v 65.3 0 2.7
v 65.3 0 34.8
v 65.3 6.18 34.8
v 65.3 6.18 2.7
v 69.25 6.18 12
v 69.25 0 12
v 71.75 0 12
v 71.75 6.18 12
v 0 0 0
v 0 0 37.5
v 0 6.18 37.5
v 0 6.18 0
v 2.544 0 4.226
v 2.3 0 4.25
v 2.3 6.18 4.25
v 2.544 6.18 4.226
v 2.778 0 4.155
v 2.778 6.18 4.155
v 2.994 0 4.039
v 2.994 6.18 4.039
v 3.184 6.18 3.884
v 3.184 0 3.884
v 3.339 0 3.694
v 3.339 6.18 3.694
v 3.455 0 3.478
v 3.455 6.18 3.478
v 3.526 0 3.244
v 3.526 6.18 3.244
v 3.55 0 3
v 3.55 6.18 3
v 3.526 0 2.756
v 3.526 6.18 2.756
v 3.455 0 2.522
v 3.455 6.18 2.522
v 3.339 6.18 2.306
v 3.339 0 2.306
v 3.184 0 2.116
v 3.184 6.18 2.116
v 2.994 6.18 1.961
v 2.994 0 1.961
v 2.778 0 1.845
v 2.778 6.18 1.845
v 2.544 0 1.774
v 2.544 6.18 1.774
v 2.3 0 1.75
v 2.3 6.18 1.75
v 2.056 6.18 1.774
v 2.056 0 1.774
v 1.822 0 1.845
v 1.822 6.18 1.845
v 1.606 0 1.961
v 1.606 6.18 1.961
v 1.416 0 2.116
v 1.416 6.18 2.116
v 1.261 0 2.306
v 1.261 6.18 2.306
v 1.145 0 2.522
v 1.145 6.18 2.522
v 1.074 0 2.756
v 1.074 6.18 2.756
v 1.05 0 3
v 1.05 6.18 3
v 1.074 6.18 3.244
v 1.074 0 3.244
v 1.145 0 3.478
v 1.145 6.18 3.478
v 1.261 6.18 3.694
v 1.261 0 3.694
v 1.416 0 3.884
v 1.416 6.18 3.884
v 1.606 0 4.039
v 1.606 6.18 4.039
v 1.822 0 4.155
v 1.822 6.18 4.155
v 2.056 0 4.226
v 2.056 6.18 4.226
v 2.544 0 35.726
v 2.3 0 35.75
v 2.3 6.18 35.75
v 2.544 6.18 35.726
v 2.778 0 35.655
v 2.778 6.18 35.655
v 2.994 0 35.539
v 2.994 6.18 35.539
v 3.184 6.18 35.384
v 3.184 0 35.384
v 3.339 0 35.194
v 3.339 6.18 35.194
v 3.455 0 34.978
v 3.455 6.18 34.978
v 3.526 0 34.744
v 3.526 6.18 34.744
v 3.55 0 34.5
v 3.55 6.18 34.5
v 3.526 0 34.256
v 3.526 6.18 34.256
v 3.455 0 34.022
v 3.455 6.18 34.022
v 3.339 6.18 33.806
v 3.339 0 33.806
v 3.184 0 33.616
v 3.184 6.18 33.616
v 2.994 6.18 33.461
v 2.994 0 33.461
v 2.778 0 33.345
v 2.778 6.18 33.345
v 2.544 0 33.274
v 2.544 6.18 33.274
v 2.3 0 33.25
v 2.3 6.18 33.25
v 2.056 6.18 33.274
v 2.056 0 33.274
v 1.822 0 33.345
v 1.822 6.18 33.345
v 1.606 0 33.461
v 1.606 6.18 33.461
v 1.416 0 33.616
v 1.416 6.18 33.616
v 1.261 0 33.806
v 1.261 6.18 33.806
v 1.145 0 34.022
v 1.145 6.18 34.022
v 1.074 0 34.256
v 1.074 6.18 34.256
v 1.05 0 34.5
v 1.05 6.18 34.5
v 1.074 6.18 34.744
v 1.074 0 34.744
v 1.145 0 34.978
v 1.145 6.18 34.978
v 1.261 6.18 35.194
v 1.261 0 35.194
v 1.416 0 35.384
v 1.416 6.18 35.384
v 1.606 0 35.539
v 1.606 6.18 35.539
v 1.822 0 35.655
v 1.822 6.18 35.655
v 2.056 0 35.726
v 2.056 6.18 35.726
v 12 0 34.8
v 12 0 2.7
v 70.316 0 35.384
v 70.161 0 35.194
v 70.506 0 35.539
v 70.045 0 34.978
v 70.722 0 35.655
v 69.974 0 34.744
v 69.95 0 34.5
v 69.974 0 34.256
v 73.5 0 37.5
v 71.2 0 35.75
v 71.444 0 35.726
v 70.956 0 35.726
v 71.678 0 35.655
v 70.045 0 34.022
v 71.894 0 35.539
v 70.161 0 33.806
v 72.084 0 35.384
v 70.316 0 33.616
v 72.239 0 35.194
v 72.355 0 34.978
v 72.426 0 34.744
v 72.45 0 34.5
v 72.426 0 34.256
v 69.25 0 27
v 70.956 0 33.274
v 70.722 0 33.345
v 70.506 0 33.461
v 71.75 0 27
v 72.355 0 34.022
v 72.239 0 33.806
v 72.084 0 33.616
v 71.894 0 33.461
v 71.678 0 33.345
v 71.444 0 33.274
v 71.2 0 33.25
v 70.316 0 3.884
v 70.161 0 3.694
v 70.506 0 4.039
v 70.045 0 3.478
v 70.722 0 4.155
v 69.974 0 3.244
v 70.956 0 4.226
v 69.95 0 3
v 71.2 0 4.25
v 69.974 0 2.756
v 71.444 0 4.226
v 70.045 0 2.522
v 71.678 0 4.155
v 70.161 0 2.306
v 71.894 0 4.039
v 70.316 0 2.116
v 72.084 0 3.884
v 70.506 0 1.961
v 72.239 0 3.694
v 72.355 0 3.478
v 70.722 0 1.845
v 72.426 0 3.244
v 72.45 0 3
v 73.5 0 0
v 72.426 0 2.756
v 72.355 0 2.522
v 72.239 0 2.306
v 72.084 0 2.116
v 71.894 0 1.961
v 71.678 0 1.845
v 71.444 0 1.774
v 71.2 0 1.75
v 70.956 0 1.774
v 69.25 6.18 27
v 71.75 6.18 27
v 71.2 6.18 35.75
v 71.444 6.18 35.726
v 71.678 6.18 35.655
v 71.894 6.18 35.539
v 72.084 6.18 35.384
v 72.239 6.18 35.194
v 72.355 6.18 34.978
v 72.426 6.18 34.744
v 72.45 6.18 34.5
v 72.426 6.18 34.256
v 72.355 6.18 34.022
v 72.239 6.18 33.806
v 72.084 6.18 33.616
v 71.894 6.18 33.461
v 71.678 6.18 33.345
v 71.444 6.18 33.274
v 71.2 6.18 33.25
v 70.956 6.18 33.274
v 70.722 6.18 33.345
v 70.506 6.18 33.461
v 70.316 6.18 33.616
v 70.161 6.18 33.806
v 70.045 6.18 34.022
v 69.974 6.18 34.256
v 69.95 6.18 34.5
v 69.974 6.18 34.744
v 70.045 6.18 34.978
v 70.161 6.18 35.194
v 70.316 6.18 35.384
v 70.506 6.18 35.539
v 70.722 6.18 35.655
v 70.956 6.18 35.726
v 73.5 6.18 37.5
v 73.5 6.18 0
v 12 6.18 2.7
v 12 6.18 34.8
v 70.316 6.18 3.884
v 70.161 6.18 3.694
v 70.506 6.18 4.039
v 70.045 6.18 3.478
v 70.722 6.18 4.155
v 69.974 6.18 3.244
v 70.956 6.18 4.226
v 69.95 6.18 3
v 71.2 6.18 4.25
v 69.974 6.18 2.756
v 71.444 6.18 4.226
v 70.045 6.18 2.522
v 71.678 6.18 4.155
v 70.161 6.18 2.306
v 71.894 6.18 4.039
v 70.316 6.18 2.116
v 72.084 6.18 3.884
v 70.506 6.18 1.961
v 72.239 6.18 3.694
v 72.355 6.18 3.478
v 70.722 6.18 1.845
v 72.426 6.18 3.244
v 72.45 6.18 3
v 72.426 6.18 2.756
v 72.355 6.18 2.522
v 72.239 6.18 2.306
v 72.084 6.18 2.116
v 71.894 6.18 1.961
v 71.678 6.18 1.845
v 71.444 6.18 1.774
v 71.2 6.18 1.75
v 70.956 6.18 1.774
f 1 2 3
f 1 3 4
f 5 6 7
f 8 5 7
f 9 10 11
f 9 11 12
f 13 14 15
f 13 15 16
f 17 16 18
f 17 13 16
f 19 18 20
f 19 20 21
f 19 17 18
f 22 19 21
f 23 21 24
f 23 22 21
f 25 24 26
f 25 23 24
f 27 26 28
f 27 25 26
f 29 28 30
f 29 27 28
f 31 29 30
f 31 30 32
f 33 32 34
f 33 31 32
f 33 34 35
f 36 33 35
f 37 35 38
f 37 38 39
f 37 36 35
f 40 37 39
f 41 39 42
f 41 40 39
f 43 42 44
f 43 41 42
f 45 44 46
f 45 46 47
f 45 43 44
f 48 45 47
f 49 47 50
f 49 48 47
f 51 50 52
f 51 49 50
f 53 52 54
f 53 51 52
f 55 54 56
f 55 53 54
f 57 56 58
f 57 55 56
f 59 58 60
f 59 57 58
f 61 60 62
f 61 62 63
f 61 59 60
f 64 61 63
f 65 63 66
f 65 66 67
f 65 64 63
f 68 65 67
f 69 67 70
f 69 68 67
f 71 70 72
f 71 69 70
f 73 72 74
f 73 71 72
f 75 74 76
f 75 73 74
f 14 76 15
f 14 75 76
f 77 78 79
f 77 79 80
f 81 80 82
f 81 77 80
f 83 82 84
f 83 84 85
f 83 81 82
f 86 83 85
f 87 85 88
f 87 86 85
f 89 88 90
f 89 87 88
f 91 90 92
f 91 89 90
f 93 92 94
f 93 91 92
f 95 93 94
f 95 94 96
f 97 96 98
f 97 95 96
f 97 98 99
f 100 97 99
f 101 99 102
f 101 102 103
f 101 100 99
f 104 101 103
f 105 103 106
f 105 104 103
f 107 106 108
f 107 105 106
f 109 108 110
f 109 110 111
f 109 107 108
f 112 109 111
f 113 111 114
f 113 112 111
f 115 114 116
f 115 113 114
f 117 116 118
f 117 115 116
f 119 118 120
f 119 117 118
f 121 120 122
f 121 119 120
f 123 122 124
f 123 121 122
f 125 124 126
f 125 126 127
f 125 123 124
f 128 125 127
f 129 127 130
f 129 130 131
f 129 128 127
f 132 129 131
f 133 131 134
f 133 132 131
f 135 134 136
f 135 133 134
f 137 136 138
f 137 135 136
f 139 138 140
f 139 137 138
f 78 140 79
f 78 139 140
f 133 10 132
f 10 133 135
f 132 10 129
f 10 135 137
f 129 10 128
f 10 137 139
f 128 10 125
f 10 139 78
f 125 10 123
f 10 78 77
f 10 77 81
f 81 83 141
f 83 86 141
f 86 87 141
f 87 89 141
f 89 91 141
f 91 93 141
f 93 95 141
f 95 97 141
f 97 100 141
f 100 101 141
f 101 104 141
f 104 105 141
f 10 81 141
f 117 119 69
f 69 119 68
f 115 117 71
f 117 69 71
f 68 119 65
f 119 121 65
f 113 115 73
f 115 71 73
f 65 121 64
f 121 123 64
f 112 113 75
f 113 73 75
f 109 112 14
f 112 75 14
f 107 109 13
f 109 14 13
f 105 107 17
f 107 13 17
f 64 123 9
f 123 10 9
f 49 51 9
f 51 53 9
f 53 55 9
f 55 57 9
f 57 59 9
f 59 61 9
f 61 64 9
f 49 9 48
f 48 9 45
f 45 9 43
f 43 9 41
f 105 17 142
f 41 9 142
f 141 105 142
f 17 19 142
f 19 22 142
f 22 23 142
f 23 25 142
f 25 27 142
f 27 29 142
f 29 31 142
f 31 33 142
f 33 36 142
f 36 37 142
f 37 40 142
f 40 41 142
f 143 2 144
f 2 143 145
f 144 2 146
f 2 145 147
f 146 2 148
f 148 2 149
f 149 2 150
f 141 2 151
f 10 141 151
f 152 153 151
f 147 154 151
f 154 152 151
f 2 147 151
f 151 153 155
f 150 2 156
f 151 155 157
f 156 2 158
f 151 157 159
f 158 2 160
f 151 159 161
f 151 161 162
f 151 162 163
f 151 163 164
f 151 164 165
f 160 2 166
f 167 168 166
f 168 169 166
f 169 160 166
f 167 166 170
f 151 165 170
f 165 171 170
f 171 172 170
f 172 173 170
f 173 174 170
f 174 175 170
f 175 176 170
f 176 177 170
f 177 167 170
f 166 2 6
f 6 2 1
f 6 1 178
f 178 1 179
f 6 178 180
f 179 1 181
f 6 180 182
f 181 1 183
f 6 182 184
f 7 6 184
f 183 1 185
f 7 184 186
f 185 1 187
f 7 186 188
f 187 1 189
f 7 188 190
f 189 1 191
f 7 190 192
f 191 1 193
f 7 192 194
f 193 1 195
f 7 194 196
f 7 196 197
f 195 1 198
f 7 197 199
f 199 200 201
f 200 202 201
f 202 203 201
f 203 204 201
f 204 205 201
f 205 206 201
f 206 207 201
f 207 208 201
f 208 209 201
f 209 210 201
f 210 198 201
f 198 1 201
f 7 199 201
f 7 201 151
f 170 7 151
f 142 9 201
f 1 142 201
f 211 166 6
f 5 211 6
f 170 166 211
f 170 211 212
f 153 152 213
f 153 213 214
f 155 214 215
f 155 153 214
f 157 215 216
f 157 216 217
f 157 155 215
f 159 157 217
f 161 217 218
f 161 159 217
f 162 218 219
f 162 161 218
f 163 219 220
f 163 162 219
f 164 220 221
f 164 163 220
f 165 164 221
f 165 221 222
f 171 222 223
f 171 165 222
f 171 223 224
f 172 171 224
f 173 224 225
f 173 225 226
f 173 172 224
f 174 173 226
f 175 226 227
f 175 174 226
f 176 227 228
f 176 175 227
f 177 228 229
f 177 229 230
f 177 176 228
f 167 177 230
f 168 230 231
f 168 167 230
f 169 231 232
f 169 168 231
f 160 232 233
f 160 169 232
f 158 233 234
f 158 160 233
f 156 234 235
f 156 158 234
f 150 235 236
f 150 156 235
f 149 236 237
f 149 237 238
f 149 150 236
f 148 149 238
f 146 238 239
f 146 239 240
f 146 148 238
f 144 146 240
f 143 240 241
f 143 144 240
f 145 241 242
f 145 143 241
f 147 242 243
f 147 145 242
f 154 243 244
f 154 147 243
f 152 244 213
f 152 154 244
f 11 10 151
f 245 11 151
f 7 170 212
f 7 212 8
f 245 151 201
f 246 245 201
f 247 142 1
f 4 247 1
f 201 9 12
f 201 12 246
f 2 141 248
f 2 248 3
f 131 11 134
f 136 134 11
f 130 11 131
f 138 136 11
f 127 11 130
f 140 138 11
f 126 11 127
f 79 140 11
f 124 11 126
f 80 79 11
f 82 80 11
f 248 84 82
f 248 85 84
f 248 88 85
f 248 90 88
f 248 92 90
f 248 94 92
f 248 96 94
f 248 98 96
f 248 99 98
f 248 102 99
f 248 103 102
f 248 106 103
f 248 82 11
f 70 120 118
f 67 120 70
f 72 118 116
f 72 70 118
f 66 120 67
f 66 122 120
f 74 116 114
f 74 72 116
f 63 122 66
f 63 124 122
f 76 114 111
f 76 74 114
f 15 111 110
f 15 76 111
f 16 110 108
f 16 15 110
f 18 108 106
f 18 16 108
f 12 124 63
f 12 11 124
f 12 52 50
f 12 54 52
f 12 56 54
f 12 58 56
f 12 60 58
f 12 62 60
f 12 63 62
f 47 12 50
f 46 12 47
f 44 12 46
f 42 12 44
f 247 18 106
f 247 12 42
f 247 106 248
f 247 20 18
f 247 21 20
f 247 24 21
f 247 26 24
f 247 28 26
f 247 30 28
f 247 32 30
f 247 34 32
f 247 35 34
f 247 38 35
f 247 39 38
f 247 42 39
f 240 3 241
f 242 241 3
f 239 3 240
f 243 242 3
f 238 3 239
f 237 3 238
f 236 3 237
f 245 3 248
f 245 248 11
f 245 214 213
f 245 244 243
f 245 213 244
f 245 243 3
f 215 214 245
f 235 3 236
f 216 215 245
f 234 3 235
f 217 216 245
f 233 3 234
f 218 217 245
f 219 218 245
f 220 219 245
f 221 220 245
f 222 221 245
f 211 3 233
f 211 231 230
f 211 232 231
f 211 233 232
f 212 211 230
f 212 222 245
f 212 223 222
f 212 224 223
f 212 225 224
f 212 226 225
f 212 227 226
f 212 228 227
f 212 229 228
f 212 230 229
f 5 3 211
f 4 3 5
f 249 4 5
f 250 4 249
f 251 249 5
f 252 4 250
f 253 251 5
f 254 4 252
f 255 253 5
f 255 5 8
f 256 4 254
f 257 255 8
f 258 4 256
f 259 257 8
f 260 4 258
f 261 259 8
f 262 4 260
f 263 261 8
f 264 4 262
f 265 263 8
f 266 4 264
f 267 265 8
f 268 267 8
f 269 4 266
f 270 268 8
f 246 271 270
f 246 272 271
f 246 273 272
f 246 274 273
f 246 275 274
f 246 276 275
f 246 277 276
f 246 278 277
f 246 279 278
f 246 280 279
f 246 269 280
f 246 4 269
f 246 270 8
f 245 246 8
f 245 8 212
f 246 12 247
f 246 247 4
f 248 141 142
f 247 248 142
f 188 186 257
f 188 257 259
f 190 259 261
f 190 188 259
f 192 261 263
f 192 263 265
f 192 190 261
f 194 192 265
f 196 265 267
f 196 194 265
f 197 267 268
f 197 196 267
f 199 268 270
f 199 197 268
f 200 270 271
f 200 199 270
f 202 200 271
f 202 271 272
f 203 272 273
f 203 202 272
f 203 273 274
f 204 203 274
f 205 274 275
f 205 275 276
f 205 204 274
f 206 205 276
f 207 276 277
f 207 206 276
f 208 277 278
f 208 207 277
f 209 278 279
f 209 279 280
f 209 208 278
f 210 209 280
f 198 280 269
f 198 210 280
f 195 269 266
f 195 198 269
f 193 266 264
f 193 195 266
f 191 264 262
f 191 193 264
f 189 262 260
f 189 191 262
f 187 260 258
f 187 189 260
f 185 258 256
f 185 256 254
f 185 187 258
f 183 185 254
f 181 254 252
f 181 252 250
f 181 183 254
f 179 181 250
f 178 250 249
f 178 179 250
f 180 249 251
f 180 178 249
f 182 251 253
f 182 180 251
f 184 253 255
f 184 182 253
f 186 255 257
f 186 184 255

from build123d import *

# Parameters (mm, degrees)
SKETCH1_W           = 73.5
SKETCH1_H           = 37.5
SKETCH1_R           = 1.25
SKETCH1_W_2         = 53.3
SKETCH1_H_2         = 32.1
SKETCH1_W_3         = 2.5
SKETCH1_H_3         = 15
BOSS_EXTRUDE1_DEPTH = 6.18


with BuildPart() as part:
    # Sketch1 → Boss-Extrude1 (new body)
    with BuildSketch(Plane(origin=(0, 0, 0), x_dir=(1, 0, 0), z_dir=(0, 1, 0))):
        with Locations((36.75, -18.75)):
            Rectangle(SKETCH1_W, SKETCH1_H)
        with Locations(Location((2.3, -34.5, 0), (0, 0, 270))):
            Circle(SKETCH1_R, mode=Mode.SUBTRACT)
        with Locations(Location((2.3, -3, 0), (0, 0, 270))):
            Circle(SKETCH1_R, mode=Mode.SUBTRACT)
        with Locations((38.65, -18.75)):
            Rectangle(SKETCH1_W_2, SKETCH1_H_2, mode=Mode.SUBTRACT)
        with Locations(Location((71.2, -3, 0), (0, 0, 270))):
            Circle(SKETCH1_R, mode=Mode.SUBTRACT)
        with Locations(Location((71.2, -34.5, 0), (0, 0, 270))):
            Circle(SKETCH1_R, mode=Mode.SUBTRACT)
        with Locations((70.5, -19.5)):
            Rectangle(SKETCH1_W_3, SKETCH1_H_3, mode=Mode.SUBTRACT)
    extrude(amount=BOSS_EXTRUDE1_DEPTH)


solid = part.part
